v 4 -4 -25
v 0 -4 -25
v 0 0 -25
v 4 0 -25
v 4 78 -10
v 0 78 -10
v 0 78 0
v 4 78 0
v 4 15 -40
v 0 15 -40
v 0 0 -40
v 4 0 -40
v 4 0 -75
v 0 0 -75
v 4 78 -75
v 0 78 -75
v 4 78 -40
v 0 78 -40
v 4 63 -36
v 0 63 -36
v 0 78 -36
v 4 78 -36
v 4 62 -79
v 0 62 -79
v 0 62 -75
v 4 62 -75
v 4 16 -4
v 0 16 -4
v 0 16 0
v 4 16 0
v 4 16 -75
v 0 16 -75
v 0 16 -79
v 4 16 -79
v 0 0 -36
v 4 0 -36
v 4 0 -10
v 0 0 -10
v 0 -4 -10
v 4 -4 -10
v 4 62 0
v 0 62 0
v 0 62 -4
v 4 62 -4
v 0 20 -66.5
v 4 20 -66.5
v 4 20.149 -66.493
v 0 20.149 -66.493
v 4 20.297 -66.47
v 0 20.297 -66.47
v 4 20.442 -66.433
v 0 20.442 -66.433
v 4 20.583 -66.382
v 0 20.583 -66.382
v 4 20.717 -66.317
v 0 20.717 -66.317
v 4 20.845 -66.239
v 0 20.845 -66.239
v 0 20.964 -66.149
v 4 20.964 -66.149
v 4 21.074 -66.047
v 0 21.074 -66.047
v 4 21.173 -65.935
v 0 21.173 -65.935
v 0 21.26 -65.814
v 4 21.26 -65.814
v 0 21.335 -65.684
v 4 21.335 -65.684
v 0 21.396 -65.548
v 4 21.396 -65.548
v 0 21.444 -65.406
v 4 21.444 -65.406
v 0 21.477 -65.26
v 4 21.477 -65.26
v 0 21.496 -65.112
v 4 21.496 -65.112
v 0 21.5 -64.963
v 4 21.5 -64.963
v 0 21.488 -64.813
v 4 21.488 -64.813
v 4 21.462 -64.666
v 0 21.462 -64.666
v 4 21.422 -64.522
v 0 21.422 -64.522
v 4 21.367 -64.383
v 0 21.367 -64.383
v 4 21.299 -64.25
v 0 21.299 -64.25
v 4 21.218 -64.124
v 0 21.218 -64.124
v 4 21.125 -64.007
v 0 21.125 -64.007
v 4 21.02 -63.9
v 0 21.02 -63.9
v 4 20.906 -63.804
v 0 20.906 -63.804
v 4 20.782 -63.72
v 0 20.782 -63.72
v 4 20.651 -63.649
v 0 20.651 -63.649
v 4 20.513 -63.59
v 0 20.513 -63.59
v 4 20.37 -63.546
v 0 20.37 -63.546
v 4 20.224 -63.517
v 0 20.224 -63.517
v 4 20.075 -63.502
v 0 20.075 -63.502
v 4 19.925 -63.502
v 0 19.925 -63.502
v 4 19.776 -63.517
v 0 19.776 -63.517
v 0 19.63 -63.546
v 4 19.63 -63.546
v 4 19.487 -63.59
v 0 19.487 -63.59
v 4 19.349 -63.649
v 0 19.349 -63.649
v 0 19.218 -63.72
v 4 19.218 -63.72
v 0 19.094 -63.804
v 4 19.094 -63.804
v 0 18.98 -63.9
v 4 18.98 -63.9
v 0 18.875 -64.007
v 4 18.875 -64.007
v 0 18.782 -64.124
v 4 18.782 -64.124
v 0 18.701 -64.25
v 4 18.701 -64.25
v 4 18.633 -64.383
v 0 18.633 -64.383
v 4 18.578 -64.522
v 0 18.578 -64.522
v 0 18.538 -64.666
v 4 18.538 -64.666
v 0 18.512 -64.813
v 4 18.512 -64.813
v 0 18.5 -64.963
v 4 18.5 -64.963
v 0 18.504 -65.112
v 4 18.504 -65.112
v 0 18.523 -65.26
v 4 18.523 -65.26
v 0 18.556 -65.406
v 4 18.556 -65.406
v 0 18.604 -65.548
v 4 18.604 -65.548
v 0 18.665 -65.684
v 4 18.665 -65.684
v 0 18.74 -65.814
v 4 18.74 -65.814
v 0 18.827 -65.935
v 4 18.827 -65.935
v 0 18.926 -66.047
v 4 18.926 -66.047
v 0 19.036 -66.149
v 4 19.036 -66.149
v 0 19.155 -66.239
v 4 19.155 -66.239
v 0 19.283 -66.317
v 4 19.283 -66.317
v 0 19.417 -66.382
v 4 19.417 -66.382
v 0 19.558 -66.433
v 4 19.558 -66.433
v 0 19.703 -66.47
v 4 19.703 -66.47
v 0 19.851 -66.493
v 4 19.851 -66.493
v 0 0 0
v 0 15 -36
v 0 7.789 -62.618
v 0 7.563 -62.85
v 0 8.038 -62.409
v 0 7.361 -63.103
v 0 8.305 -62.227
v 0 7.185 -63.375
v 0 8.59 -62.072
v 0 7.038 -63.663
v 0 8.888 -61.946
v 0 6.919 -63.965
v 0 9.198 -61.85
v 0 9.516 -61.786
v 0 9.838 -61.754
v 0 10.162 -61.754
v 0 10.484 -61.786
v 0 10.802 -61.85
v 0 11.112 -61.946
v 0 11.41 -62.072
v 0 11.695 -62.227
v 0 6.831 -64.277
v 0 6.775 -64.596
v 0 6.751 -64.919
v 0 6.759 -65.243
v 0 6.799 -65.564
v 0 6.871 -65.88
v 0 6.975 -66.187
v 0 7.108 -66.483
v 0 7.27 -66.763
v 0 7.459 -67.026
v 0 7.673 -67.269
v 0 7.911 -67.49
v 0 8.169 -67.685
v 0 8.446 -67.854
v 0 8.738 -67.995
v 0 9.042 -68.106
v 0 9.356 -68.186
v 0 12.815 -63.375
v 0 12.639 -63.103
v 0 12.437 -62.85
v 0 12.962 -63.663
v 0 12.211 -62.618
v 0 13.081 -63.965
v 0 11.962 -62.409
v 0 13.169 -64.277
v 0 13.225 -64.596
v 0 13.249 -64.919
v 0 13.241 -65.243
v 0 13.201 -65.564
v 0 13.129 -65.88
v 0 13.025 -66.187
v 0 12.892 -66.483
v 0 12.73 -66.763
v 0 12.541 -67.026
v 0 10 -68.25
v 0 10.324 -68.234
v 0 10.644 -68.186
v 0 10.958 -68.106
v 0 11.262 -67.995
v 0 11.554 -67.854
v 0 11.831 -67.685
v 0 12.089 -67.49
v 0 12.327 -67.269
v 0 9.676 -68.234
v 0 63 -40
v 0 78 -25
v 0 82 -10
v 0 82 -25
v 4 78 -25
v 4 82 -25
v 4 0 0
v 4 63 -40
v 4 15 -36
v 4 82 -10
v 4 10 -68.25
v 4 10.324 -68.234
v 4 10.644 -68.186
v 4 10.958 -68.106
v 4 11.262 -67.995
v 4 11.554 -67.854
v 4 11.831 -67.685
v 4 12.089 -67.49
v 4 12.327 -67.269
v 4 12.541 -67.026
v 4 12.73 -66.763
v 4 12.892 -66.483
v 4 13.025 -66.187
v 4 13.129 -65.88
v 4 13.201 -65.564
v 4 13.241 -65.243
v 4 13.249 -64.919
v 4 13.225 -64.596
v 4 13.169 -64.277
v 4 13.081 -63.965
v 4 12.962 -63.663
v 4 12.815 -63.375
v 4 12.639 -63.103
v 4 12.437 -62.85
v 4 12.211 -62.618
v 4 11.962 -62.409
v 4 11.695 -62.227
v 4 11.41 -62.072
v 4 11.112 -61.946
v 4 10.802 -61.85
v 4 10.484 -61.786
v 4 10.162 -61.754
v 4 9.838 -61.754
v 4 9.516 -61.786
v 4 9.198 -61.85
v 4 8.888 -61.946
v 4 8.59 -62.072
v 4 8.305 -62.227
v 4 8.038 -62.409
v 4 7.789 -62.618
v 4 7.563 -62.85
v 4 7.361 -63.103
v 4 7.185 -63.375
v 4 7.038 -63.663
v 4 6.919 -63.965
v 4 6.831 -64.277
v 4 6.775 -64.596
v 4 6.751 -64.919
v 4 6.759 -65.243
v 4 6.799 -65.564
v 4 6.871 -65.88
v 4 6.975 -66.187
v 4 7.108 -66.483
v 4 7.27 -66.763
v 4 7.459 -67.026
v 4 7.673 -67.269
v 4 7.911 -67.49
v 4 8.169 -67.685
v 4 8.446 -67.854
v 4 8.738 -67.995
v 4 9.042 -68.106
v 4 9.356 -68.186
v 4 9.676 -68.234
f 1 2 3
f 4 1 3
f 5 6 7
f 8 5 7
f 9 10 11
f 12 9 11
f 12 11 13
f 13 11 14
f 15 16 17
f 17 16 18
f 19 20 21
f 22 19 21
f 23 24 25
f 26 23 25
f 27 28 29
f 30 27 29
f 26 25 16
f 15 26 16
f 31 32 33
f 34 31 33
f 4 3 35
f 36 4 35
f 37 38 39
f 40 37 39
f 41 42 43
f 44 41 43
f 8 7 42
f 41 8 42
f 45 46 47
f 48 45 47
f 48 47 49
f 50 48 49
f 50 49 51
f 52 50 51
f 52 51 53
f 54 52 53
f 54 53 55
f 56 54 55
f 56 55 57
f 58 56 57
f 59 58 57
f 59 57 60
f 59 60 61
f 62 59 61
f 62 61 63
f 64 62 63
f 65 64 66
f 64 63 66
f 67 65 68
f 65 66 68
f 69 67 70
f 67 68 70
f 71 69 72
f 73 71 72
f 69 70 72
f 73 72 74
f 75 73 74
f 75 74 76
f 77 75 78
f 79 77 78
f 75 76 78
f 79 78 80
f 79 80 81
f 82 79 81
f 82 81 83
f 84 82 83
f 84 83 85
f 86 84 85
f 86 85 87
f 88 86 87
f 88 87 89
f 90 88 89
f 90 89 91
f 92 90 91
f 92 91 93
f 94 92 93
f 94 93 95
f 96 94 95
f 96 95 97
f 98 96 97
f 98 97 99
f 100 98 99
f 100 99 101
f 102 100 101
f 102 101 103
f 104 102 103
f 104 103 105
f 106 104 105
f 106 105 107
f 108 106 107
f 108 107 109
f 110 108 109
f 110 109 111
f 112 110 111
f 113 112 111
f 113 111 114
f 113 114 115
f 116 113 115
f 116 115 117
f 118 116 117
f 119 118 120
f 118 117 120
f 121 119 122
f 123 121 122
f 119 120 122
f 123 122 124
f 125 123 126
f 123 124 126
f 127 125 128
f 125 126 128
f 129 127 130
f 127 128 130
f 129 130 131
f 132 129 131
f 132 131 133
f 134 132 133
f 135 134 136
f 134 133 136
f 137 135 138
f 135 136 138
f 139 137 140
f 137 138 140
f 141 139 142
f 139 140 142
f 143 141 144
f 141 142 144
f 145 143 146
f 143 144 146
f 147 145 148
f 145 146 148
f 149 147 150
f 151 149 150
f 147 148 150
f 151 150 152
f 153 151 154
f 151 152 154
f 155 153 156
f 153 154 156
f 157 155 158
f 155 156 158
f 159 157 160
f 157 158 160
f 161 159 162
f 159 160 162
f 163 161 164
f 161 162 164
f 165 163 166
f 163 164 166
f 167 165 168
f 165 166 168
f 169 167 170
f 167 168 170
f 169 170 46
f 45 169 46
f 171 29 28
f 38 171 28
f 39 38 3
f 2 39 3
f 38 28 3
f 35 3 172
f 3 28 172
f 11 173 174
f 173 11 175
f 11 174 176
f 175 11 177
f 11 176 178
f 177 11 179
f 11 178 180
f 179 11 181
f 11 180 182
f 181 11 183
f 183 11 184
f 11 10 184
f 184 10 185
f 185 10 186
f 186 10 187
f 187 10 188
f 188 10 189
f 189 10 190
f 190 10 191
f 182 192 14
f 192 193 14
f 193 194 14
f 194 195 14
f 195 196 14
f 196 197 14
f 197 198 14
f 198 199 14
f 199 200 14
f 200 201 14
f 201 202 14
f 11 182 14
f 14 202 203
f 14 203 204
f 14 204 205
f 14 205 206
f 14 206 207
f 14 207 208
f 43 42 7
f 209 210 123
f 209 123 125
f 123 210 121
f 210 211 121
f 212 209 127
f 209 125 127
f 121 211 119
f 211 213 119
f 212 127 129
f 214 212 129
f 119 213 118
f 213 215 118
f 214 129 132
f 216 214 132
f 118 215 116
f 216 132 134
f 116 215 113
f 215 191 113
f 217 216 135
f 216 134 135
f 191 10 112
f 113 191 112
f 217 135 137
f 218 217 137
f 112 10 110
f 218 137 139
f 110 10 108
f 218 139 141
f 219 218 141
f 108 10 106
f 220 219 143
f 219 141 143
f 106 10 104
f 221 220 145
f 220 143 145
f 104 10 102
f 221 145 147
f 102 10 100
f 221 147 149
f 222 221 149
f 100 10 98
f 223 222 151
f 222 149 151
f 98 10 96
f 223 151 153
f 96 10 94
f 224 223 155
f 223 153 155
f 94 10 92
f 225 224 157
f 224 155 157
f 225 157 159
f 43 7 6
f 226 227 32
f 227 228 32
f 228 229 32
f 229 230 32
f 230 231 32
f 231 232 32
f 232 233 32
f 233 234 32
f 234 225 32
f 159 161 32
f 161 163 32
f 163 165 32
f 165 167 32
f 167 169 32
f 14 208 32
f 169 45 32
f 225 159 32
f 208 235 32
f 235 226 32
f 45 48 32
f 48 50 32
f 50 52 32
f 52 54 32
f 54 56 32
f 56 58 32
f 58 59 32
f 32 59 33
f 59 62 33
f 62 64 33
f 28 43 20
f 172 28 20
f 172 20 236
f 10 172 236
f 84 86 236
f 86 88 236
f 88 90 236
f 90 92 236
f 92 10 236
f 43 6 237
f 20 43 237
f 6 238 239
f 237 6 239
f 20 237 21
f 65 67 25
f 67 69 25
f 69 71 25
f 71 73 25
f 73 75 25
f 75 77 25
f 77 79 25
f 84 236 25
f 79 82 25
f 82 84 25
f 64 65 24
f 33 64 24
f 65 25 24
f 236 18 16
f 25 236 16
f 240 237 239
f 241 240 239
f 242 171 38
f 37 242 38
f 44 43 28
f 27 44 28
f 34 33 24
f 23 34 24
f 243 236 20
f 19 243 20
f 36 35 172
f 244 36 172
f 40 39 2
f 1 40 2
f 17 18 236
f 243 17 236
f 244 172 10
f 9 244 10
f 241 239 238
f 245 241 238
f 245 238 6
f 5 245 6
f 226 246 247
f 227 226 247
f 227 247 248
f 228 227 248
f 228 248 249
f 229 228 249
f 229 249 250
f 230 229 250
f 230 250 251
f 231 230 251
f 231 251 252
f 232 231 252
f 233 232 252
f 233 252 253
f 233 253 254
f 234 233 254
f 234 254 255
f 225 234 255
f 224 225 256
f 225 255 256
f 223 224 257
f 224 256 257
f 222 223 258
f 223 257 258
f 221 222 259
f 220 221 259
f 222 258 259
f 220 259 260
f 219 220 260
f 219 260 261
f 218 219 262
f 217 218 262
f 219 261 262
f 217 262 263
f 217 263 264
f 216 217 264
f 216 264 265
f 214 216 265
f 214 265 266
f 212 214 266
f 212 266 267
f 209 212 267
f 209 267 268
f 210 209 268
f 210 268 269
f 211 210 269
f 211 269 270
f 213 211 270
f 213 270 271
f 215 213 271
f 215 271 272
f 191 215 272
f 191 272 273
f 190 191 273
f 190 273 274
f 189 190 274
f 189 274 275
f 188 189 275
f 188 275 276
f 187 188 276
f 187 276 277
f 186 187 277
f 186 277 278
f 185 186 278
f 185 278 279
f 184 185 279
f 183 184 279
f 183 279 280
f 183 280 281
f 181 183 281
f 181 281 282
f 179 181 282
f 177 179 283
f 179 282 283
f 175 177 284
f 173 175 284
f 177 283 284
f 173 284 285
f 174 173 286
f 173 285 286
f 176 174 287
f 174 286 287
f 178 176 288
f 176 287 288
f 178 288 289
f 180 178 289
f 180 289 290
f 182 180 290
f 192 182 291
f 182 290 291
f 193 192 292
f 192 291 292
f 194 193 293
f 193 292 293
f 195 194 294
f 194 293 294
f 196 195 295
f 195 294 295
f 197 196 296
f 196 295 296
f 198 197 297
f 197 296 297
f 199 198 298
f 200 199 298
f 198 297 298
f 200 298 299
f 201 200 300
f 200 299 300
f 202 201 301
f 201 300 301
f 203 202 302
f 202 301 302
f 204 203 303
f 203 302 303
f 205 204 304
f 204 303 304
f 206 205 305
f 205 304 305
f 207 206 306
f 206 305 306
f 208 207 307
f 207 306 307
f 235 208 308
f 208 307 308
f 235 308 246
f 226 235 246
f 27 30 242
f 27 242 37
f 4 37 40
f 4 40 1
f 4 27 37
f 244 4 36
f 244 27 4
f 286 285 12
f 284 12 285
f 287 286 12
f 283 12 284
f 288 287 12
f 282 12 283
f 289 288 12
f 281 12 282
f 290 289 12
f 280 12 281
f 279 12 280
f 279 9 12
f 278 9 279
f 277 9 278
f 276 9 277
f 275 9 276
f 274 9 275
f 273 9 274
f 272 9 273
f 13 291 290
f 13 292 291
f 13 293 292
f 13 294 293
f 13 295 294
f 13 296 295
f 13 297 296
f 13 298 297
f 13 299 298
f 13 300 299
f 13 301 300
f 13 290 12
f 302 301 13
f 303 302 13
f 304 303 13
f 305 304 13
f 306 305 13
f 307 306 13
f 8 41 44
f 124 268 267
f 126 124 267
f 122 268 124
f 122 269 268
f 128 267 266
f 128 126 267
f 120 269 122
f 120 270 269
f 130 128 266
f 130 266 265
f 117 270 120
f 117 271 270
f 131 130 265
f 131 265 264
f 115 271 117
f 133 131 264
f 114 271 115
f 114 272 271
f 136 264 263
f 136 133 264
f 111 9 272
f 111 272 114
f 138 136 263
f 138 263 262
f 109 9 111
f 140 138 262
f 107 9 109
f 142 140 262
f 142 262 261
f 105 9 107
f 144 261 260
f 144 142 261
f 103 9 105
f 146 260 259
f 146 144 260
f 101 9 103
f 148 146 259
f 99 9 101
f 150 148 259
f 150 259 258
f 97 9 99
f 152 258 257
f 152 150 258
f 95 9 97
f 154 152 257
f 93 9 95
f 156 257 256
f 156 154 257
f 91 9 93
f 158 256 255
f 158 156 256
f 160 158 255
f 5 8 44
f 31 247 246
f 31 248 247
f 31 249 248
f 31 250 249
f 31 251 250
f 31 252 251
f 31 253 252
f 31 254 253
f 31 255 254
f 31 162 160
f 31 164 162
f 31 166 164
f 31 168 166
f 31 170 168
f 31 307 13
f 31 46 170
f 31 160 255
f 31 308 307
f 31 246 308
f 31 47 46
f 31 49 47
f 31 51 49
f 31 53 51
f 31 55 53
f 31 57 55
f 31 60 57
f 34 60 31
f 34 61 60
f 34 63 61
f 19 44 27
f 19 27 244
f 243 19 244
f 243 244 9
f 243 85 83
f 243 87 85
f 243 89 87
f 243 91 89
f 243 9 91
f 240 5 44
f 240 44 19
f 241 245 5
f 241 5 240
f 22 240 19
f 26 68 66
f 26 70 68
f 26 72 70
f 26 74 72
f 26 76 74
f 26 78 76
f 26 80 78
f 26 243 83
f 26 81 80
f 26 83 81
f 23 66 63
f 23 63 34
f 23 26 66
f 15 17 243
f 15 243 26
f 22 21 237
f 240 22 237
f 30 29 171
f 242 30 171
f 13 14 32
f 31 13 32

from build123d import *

# Parameters (mm, degrees)
BOSS_EXTRUDE1_DEPTH = 4
SKETCH2_R           = 3.25
SKETCH2_R_2         = 1.5
CUT_EXTRUDE1_DEPTH  = 114.934191532


with BuildPart() as part:
    # Sketch1 → Boss-Extrude1 (new body)
    with BuildSketch(Plane(origin=(0, 0, 0), x_dir=(0, 0, -1), z_dir=(1, 0, 0))):
        Polygon((10, 0), (10, -4), (25, -4), (25, 0), (36, 0), (36, 15), (40, 15), (40, 0), (75, 0), (75, 16), (79, 16), (79, 62), (75, 62), (75, 78), (40, 78), (40, 63), (36, 63), (36, 78), (25, 78), (25, 82), (10, 82), (10, 78), (0, 78), (0, 62), (4, 62), (4, 16), (0, 16), (0, 0), align=None)
    extrude(amount=BOSS_EXTRUDE1_DEPTH)

    # Sketch2 → Cut-Extrude1 (cut, through all)
    with BuildSketch(Plane(origin=(4, 0, 0), x_dir=(0, 0, -1), z_dir=(1, 0, 0))):
        with Locations((65, 10)):
            Circle(SKETCH2_R)
        with Locations((65, 20)):
            Circle(SKETCH2_R_2)
    extrude(amount=-CUT_EXTRUDE1_DEPTH, mode=Mode.SUBTRACT)


solid = part.part
